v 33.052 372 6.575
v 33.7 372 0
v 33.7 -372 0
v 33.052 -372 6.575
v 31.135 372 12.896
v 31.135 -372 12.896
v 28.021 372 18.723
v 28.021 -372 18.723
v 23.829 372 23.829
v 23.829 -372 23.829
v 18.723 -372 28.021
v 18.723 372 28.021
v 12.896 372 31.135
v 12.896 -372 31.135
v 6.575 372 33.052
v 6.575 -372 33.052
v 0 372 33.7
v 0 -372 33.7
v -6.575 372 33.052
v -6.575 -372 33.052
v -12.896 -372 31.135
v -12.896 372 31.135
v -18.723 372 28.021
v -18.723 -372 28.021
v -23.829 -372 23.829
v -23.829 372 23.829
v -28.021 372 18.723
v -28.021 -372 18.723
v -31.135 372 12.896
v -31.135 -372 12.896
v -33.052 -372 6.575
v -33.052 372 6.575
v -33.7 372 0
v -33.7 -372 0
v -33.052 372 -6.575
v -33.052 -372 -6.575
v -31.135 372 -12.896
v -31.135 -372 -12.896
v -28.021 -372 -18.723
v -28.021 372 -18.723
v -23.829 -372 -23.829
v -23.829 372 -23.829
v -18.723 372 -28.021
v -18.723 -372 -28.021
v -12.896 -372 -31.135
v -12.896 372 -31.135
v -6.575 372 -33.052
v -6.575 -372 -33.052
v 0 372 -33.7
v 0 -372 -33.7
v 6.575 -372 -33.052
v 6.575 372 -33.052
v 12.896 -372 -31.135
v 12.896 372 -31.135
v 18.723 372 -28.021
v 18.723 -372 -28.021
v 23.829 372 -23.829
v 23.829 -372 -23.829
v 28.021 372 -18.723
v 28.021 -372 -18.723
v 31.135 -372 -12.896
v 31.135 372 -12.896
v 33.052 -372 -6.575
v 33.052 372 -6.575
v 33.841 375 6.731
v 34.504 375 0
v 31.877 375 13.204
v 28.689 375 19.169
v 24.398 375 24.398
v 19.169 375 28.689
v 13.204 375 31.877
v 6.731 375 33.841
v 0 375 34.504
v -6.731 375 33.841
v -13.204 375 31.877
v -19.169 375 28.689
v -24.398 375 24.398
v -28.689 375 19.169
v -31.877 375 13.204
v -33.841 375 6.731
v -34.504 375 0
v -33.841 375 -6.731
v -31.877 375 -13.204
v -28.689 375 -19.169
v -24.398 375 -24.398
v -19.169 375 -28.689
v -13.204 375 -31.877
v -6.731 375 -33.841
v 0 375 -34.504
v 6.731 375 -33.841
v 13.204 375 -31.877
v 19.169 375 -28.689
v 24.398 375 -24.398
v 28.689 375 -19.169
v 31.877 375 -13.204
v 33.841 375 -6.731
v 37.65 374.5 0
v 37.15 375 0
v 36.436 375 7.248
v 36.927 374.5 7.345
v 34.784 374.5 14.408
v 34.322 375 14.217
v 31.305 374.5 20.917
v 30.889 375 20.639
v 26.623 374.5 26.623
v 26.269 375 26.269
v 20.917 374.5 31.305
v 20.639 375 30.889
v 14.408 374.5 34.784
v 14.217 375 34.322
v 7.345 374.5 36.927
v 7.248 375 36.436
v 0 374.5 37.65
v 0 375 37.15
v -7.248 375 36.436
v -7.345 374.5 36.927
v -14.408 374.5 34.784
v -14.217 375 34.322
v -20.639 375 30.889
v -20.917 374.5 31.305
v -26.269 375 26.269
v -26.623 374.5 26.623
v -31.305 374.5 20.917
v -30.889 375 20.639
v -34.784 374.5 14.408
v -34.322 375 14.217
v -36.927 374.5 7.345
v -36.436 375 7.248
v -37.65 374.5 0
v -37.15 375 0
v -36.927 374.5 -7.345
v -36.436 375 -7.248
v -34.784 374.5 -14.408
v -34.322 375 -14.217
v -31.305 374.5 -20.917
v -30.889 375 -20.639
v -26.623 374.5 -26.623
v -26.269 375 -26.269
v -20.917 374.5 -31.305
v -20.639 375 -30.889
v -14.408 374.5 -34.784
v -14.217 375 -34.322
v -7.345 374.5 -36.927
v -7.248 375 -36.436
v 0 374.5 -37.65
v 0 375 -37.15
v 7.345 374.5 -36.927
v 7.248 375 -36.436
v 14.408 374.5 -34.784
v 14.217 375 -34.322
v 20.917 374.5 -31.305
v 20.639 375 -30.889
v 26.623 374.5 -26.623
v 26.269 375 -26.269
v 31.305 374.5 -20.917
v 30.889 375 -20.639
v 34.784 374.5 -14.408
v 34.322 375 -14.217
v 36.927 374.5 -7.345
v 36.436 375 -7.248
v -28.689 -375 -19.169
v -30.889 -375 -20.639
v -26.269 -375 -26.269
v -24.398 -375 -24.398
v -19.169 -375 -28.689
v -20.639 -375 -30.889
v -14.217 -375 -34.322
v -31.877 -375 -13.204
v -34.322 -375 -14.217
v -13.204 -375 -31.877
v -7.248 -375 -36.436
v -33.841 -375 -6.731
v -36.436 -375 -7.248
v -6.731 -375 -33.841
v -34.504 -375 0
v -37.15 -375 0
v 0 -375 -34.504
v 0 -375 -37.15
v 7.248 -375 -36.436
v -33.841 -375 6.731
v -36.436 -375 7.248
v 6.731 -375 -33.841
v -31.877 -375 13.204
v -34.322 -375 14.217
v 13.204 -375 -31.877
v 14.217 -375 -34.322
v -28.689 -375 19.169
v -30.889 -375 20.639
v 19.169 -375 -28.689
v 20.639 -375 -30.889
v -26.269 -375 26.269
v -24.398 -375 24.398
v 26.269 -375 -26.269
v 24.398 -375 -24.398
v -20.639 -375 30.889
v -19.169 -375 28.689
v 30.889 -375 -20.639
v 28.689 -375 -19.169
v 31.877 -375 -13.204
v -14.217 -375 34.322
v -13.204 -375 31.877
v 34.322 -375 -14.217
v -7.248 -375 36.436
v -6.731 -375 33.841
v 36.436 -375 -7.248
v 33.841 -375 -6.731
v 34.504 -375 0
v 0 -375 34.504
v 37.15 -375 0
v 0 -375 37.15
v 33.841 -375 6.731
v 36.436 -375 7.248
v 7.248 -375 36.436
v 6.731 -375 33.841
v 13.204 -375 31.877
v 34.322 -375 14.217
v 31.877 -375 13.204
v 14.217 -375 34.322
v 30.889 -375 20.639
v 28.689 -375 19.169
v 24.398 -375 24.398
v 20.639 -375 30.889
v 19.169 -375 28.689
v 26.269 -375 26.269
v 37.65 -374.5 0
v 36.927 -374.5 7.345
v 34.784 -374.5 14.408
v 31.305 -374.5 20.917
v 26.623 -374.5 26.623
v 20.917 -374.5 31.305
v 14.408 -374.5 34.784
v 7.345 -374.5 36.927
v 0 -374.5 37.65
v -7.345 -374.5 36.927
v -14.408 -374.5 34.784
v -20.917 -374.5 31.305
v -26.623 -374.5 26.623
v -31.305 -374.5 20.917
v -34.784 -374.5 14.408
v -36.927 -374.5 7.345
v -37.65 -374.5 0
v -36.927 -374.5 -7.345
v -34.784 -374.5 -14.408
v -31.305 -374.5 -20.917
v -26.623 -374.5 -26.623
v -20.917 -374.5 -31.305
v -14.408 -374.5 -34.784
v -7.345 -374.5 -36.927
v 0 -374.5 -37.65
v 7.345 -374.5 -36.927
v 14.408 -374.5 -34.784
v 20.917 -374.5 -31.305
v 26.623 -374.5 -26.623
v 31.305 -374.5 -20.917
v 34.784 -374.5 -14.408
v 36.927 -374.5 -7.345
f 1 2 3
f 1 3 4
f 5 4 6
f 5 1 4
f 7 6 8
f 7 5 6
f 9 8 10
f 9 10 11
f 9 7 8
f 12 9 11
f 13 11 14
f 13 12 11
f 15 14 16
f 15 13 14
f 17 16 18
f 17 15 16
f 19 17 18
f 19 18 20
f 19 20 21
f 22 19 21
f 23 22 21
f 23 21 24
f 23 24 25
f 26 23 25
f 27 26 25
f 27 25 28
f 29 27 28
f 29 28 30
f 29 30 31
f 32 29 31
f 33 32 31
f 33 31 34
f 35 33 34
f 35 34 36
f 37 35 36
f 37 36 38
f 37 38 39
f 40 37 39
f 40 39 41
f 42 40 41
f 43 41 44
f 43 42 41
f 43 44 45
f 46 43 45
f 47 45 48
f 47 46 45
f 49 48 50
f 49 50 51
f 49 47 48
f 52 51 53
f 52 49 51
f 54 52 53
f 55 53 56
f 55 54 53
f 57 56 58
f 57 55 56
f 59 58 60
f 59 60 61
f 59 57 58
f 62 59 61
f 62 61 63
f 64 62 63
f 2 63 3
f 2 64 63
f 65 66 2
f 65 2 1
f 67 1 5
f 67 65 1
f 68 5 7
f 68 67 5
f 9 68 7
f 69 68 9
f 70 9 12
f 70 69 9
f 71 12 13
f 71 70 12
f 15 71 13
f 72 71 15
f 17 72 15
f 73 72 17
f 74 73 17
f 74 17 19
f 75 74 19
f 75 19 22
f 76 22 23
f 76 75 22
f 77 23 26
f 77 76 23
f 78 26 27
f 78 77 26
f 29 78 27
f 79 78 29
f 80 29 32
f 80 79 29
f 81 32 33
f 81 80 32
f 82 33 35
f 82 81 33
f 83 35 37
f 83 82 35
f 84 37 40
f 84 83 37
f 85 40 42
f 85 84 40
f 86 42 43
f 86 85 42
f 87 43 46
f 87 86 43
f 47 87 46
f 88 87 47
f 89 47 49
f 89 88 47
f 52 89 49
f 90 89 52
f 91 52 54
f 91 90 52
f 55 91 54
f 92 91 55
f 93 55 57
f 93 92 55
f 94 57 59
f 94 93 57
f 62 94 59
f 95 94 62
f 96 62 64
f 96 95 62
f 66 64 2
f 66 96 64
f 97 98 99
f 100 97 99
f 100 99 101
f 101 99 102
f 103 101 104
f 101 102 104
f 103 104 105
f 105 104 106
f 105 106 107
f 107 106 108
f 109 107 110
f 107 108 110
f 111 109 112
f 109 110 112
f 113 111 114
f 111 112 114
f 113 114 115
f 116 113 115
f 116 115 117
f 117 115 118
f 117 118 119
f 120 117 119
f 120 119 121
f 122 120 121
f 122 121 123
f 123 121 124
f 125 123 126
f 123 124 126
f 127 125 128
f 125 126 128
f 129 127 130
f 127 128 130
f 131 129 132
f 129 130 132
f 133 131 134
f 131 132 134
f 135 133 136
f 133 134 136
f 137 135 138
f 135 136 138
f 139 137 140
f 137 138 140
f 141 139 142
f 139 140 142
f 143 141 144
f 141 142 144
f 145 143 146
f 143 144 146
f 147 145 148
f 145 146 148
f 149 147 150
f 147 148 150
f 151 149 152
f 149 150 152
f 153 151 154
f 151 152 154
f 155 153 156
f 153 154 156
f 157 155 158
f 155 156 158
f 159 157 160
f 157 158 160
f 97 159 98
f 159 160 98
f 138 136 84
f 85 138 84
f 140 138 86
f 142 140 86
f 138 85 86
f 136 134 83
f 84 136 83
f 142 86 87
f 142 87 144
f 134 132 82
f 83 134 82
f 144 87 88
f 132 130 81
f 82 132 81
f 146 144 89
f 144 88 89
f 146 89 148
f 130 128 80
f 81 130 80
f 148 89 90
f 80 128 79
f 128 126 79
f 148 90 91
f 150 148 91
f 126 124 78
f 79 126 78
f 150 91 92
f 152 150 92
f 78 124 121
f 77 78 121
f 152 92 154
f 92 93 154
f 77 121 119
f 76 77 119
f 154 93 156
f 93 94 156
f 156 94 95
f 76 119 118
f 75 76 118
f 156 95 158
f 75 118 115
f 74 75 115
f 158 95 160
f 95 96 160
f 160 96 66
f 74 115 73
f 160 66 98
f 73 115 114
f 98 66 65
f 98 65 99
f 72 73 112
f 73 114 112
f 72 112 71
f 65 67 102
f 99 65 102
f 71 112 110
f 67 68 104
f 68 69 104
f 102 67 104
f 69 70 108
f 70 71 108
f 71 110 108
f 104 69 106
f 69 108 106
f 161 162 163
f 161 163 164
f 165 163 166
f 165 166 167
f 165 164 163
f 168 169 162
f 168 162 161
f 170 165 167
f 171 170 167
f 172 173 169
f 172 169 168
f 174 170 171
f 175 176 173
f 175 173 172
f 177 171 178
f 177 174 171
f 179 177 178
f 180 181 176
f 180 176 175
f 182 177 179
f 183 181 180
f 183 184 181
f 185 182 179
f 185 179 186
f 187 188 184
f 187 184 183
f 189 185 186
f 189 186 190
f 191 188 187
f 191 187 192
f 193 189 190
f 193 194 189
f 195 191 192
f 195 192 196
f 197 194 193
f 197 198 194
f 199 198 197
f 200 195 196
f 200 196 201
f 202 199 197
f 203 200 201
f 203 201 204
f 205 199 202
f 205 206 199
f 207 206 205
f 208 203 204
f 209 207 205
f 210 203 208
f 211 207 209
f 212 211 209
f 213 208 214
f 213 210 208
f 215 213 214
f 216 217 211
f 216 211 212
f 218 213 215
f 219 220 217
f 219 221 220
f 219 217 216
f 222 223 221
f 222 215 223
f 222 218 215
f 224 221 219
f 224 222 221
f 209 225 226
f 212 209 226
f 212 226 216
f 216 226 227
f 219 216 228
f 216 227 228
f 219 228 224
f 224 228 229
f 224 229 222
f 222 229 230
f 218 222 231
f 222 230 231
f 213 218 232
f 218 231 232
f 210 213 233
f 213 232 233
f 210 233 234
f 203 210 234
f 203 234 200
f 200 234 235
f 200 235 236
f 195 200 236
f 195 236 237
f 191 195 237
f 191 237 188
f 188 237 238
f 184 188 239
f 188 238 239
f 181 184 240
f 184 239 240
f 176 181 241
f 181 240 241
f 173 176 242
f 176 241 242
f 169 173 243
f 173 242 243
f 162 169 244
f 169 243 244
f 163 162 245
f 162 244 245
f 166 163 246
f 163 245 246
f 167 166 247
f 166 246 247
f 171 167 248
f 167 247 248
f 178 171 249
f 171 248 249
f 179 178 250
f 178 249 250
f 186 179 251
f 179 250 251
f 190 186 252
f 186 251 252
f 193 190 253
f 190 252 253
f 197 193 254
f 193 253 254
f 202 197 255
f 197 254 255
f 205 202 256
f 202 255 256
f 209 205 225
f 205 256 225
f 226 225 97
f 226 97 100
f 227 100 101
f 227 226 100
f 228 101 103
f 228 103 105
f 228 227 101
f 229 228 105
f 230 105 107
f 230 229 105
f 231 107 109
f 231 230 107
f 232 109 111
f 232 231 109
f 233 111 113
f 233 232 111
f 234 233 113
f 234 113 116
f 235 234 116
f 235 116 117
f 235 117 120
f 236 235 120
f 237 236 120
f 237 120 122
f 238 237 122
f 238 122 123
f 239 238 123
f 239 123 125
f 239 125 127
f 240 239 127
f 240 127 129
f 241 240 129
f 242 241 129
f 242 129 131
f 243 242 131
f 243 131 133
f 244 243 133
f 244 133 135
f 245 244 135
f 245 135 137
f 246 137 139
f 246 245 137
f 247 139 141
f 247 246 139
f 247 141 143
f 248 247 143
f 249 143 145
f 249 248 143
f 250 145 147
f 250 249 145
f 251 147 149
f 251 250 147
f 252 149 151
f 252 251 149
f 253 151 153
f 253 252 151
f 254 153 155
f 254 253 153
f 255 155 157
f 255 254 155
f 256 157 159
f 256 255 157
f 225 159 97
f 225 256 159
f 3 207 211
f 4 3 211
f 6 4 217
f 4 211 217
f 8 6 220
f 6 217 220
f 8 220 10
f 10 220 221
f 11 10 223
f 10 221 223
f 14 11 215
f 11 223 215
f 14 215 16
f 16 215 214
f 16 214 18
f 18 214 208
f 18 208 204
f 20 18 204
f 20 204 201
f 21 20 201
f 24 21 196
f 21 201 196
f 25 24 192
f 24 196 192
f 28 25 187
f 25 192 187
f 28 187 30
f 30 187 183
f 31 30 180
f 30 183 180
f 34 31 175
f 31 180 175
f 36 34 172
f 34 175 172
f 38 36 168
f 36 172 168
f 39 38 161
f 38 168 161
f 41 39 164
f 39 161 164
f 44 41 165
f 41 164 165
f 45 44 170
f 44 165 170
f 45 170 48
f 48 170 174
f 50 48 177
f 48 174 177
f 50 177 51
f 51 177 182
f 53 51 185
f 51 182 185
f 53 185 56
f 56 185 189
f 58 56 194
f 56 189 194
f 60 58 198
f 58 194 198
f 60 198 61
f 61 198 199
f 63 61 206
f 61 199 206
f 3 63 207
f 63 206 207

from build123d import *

# Parameters (mm, degrees)
F0_R     = 37.65
F0_R_2   = 33.7
F1_DEPTH = 375
F2_SIZE2 = 0.8038475773
F2_SIZE  = 3
F3_SIZE  = 0.5


with BuildPart() as f1:
    # F0 (on Front) → F1 (new body, symmetric)
    with BuildSketch(Plane.XZ):
        Circle(F0_R)
        Circle(F0_R_2, mode=Mode.SUBTRACT)
    extrude(amount=F1_DEPTH, both=True)

    # F2
    f2_edges = [f1.edges().sort_by_distance(p)[0] for p in [
        (-33.7, -375, 0),
        (-33.7, 375, 0),
    ]]
    f2_side = f1.faces().sort_by_distance((-33.7, 0, 0))[0]
    chamfer(f2_edges, length=F2_SIZE, length2=F2_SIZE2, reference=f2_side)

    # F3
    f3_edges = [f1.edges().sort_by_distance(p)[0] for p in [
        (-37.65, -375, 0),
        (-37.65, 375, 0),
    ]]
    chamfer(f3_edges, length=F3_SIZE)


solid = f1.part
